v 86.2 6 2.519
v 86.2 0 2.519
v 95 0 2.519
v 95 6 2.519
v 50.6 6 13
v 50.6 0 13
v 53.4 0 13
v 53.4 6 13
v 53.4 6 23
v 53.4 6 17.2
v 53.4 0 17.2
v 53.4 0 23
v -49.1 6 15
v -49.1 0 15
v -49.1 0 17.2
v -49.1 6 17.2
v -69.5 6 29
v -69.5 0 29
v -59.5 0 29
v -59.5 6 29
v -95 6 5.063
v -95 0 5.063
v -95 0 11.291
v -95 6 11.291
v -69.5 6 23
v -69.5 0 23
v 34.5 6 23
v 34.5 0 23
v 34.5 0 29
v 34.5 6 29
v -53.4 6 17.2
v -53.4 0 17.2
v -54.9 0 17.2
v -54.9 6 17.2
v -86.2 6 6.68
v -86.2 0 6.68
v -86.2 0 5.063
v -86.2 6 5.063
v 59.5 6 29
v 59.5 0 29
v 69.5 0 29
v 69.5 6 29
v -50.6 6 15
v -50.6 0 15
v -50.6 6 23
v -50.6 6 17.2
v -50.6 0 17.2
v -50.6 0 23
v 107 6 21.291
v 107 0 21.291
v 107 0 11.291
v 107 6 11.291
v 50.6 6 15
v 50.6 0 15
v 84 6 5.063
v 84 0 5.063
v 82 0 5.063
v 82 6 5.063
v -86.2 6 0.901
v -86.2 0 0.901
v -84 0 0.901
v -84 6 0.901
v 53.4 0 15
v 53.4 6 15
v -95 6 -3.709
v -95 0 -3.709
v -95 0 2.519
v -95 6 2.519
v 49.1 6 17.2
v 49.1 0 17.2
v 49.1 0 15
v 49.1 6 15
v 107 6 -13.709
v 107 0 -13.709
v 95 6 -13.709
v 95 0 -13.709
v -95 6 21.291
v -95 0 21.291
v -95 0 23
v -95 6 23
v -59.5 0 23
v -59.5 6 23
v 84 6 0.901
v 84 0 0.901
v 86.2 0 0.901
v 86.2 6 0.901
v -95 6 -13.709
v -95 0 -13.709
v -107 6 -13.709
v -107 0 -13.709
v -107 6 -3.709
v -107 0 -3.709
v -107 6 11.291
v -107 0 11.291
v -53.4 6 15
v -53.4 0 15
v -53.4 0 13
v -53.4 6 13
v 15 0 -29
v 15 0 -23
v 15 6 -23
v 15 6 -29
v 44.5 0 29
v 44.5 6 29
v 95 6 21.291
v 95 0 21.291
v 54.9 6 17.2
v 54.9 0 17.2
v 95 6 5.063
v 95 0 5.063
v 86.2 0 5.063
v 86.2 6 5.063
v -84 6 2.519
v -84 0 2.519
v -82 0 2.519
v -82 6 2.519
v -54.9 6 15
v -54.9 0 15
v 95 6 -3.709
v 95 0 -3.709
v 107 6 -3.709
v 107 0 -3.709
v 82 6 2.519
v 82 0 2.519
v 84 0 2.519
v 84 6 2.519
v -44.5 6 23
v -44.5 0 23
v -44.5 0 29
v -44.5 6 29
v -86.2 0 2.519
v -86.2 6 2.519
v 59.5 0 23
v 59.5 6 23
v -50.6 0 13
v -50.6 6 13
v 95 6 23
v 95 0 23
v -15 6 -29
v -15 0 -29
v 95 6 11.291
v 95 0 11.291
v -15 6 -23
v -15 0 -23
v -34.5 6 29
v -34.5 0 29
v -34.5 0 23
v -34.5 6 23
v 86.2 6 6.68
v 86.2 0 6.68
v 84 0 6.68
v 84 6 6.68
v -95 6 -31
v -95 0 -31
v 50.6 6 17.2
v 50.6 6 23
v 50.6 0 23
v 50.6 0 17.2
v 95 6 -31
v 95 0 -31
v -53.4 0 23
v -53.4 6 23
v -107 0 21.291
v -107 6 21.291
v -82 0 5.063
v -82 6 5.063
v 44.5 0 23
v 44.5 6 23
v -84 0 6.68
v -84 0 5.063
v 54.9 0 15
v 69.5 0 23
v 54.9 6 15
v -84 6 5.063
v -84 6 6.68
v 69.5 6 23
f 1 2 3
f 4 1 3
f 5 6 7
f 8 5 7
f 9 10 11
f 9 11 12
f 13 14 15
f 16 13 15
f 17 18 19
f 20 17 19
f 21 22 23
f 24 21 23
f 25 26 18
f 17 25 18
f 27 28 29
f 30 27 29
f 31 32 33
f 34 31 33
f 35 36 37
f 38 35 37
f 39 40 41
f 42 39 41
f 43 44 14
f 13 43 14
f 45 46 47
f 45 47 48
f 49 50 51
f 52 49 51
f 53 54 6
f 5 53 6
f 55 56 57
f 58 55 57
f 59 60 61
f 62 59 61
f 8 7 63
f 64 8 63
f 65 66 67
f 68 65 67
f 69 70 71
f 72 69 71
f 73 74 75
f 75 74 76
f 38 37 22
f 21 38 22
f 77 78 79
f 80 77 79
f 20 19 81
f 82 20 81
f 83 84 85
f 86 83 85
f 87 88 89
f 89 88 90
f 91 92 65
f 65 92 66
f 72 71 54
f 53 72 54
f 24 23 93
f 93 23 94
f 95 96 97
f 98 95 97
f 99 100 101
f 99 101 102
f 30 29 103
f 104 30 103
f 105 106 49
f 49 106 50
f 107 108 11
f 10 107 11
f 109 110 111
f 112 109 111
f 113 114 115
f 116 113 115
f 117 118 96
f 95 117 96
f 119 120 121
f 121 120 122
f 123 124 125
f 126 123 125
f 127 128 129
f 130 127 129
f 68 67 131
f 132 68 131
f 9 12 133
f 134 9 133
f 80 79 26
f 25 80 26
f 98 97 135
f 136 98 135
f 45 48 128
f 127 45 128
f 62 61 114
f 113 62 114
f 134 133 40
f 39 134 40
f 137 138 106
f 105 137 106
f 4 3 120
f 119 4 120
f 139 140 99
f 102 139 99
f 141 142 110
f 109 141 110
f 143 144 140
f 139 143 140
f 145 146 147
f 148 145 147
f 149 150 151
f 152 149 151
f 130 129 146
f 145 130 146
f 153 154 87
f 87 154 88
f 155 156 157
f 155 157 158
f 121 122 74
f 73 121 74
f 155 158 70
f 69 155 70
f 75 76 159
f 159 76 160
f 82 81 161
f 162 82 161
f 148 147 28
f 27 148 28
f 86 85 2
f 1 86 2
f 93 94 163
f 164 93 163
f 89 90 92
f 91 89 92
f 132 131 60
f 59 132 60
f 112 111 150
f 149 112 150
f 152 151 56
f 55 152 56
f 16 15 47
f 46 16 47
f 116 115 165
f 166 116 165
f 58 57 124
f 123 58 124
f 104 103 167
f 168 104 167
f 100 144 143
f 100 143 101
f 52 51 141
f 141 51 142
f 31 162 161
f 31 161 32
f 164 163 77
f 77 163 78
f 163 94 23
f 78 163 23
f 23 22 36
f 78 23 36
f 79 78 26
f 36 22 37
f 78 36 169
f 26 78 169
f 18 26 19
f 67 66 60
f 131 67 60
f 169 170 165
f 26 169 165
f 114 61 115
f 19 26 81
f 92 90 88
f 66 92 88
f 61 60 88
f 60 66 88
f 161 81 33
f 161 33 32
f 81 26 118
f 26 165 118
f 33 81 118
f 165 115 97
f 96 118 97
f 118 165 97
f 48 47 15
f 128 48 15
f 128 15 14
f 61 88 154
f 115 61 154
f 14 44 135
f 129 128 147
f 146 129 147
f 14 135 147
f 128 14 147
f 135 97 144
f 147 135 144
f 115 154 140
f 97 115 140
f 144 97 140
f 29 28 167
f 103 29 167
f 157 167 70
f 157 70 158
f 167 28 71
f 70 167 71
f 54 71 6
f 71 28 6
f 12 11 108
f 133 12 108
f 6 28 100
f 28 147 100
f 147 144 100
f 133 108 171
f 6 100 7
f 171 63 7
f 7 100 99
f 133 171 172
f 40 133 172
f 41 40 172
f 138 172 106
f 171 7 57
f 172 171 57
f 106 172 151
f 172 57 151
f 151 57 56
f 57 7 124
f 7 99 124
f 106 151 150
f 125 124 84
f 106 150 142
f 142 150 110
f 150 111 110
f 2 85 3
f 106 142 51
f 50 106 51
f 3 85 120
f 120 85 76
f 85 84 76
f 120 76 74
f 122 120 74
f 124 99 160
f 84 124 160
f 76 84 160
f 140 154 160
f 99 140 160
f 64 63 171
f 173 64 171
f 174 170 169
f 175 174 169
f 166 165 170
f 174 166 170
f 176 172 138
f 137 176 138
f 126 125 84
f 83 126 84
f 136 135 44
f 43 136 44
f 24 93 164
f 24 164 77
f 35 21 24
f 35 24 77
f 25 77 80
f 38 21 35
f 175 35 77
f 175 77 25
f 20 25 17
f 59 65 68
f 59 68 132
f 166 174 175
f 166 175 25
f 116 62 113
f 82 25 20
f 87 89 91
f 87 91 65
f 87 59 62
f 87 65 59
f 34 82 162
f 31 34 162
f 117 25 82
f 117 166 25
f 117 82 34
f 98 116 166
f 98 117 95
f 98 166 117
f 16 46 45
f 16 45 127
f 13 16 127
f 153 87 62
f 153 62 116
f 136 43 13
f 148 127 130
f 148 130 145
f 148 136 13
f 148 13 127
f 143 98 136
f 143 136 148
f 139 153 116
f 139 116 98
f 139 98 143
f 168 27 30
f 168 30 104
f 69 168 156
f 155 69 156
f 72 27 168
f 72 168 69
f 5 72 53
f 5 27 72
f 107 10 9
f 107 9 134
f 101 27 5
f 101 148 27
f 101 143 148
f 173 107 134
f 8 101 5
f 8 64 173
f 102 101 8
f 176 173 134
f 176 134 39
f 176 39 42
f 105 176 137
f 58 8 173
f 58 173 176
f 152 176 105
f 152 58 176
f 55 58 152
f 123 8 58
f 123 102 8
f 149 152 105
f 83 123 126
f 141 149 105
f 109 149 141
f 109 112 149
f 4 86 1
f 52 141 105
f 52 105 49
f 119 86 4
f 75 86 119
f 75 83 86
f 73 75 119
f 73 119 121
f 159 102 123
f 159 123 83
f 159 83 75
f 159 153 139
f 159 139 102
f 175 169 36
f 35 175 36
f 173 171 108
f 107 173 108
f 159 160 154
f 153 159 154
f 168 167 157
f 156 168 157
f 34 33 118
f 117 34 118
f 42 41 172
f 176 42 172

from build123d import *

# Parameters (mm, degrees)
SKETCH_1_W      = 30
SKETCH_1_H      = 6
EXTRUDE_1_DEPTH = 6


with BuildPart() as part:
    # Эскиз1 → Бобышка-Вытянуть1 (new body)
    with BuildSketch(Plane(origin=(0, 0, 0), x_dir=(1, 0, 0), z_dir=(0, 1, 0))):
        Polygon((-95, 23), (-95, 13.709265489), (-107, 13.709265489), (-107, 3.709265489), (-95, 3.709265489), (-95, -2.518957871), (-86.2, -2.518957871), (-86.2, -0.901182203), (-84, -0.901182203), (-84, -2.518957871), (-82, -2.518957871), (-82, -5.062511151), (-84, -5.062511151), (-84, -6.68028682), (-86.2, -6.68028682), (-86.2, -5.062511151), (-95, -5.062511151), (-95, -11.290734511), (-107, -11.290734511), (-107, -21.290734511), (-95, -21.290734511), (-95, -23), (-69.5, -23), (-69.5, -29), (-59.5, -29), (-59.5, -23), (-53.4, -23), (-53.4, -17.2), (-54.9, -17.2), (-54.9, -15), (-53.4, -15), (-53.4, -13), (-50.6, -13), (-50.6, -15), (-49.1, -15), (-49.1, -17.2), (-50.6, -17.2), (-50.6, -23), (-44.5, -23), (-44.5, -29), (-34.5, -29), (-34.5, -23), (34.5, -23), (34.5, -29), (44.5, -29), (44.5, -23), (50.6, -23), (50.6, -17.2), (49.1, -17.2), (49.1, -15), (50.6, -15), (50.6, -13), (53.4, -13), (53.4, -15), (54.9, -15), (54.9, -17.2), (53.4, -17.2), (53.4, -23), (59.5, -23), (59.5, -29), (69.5, -29), (69.5, -23), (95, -23), (95, -21.290734511), (107, -21.290734511), (107, -11.290734511), (95, -11.290734511), (95, -5.062511151), (86.2, -5.062511151), (86.2, -6.68028682), (84, -6.68028682), (84, -5.062511151), (82, -5.062511151), (82, -2.518957871), (84, -2.518957871), (84, -0.901182203), (86.2, -0.901182203), (86.2, -2.518957871), (95, -2.518957871), (95, 3.709265489), (107, 3.709265489), (107, 13.709265489), (95, 13.709265489), (95, 23), (95, 31), (-95, 31), align=None)
        with Locations((0, 26)):
            Rectangle(SKETCH_1_W, SKETCH_1_H, mode=Mode.SUBTRACT)
    extrude(amount=EXTRUDE_1_DEPTH)


solid = part.part
